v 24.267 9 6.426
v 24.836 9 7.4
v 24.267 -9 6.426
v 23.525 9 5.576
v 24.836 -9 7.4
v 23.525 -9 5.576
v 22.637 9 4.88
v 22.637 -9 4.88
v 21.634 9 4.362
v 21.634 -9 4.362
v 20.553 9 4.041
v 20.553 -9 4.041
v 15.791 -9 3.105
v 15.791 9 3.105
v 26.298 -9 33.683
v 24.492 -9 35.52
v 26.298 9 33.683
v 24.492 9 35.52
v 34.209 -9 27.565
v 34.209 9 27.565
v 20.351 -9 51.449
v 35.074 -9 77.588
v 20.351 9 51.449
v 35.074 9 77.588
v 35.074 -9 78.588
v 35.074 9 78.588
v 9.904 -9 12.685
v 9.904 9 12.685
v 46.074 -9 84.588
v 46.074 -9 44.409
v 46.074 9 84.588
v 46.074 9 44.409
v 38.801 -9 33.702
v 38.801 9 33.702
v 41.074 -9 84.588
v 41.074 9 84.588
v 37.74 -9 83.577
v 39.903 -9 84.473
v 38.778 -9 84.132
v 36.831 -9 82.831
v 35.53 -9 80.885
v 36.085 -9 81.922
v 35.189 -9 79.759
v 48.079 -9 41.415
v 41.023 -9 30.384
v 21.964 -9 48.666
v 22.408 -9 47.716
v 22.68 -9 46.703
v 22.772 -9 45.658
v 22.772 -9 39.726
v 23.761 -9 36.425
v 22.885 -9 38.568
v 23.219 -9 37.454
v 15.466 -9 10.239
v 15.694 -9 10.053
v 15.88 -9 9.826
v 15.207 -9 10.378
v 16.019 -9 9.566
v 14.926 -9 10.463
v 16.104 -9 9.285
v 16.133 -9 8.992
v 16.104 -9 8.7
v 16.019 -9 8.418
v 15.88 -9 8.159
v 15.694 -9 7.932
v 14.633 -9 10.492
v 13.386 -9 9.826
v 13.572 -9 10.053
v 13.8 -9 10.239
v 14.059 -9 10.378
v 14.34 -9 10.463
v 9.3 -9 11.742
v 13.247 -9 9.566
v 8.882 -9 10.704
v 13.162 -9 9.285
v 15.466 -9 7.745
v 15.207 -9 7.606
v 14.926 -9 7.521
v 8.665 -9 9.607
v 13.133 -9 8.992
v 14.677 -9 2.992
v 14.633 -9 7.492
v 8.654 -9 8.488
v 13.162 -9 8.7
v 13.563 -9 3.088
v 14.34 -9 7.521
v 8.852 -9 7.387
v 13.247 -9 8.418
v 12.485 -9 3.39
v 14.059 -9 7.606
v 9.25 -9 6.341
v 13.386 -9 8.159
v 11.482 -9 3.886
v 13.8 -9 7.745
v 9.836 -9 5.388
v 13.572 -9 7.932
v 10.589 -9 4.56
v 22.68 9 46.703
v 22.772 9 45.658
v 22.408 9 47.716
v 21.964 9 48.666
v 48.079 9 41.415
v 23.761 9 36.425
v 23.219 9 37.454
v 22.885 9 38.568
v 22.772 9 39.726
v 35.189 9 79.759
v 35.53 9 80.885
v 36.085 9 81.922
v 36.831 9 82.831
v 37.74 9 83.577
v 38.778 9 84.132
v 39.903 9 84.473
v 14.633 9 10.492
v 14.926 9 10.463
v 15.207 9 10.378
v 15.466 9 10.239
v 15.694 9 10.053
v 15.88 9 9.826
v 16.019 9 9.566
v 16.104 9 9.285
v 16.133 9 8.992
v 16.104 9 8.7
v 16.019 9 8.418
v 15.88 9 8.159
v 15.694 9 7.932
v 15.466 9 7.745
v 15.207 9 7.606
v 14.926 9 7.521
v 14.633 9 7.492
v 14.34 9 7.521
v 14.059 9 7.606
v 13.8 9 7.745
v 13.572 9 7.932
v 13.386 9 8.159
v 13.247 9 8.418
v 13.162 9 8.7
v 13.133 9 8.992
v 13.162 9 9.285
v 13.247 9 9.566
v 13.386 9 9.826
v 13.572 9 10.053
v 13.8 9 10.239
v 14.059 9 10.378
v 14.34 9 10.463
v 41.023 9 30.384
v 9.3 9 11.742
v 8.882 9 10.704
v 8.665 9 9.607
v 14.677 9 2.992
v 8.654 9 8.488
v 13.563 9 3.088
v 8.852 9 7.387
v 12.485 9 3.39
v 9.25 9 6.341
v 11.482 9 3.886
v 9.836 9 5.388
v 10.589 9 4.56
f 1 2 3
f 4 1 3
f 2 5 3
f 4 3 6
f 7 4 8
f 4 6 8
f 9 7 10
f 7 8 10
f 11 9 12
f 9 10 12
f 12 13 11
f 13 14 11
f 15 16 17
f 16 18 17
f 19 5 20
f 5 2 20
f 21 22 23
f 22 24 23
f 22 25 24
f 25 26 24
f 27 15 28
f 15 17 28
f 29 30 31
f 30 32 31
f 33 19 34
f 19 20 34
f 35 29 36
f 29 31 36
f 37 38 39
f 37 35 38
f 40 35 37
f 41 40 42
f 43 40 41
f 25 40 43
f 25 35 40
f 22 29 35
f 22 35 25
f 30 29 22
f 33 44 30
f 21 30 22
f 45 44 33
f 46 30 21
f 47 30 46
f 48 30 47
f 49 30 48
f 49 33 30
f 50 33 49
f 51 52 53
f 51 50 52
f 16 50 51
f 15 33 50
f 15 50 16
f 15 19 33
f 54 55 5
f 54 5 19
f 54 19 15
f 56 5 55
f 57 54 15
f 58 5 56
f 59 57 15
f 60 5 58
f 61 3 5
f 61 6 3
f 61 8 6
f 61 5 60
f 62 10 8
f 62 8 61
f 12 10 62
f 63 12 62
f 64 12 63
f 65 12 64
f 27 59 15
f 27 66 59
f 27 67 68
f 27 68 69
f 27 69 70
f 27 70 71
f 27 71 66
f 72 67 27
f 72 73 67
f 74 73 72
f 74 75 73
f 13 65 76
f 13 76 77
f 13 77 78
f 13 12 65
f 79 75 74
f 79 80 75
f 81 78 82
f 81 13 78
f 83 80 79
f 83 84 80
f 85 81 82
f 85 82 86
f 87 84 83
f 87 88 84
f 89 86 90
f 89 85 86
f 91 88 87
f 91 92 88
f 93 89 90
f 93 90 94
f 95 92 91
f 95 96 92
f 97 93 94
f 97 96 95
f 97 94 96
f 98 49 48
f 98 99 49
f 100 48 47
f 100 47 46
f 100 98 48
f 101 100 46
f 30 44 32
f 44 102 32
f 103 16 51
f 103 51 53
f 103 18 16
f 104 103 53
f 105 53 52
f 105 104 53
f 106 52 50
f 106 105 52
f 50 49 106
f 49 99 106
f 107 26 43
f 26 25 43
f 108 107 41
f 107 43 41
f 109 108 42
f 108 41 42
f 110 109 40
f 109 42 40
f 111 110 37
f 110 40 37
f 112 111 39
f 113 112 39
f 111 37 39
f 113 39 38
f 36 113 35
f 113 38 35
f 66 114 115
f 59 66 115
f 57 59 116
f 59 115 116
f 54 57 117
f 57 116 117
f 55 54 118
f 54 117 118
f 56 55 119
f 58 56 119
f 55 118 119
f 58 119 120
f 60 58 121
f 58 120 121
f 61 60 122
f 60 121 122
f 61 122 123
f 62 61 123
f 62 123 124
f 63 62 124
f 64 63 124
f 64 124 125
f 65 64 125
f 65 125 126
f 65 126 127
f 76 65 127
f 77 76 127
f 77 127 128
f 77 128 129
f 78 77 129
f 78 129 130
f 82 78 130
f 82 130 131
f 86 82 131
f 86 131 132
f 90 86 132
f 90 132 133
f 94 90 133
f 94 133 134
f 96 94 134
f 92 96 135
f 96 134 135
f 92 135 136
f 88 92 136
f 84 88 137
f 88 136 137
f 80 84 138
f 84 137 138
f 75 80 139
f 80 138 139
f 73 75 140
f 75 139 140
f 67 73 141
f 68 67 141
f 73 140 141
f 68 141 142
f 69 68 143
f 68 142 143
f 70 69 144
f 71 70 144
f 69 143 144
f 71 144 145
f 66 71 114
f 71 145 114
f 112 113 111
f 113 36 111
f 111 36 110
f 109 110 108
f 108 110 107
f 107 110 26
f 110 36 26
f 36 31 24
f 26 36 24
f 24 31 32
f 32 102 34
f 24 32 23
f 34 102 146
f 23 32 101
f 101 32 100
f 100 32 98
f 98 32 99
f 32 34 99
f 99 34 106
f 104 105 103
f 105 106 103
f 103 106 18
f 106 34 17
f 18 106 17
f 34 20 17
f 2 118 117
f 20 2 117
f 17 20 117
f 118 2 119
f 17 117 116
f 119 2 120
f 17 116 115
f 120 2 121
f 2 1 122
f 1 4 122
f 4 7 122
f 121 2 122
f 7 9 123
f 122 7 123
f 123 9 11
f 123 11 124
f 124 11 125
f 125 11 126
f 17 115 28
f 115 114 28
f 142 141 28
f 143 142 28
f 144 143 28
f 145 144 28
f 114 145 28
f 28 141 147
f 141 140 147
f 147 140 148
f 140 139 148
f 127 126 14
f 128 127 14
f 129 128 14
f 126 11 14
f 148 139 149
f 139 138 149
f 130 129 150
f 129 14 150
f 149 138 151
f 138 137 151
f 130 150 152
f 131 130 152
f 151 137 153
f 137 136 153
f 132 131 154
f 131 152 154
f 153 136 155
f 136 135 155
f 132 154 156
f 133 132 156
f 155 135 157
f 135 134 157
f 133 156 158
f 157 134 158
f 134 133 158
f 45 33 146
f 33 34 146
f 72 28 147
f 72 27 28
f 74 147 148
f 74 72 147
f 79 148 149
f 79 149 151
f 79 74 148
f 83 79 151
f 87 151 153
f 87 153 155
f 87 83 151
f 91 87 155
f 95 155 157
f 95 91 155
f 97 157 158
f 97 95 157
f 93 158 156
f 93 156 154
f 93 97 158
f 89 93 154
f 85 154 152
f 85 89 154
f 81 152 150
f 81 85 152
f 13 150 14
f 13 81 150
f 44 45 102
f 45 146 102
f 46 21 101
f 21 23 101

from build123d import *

# Parameters (mm, degrees)
BOSS_EXTRUDE1_DEPTH = 9
FILLET1_R           = 6
FILLET2_R           = 6
FILLET3_R           = 6
SKETCH4_R           = 1.5
CUT_EXTRUDE2_DEPTH  = 99.948249762


with BuildPart() as part:
    # Sketch1 → Boss-Extrude1 (new, symmetric)
    with BuildSketch(Plane(origin=(0, 0, 0), x_dir=(1, 0, 0), z_dir=(0, 1, 0))):
        Polygon((26.298098503, -33.68255382), (0, 0), (23.549059428, -4.630529132), (34.208885562, -27.565410034), (38.800851719, -33.702486103), (41.023010007, -30.384019108), (48.078540091, -41.414607796), (46.07366082, -44.408600496), (46.07366082, -84.588475064), (35.07366082, -84.588475064), (35.07366082, -77.588475064), (20.351319641, -51.449372742), (22.771974432, -47.270927217), (22.771974432, -37.270927217), align=None)
    extrude(amount=BOSS_EXTRUDE1_DEPTH, both=True)

    # Fillet1
    fillet1_edges = [part.edges().sort_by_distance(p)[0] for p in [
        (0, 0, 0),
        (23.549059428, 0, 4.630529132),
    ]]
    fillet(fillet1_edges, radius=FILLET1_R)

    # Fillet2
    fillet2_edges = [part.edges().sort_by_distance(p)[0] for p in [
        (22.771974432, 0, 47.270927217),
        (22.771974432, 0, 37.270927217),
    ]]
    fillet(fillet2_edges, radius=FILLET2_R)

    # Fillet3
    fillet3_edges = [part.edges().sort_by_distance(p)[0] for p in [
        (35.07366082, 0, 84.588475064),
    ]]
    fillet(fillet3_edges, radius=FILLET3_R)

    # Sketch4 → Cut-Extrude2 (cut, through all)
    with BuildSketch(Plane(origin=(0, 9, 0), x_dir=(1, 0, 0), z_dir=(0, 1, 0))):
        with Locations(Location((14.632977879, -8.992224551, 0), (0, 0, 270))):
            Circle(SKETCH4_R)
    extrude(amount=-CUT_EXTRUDE2_DEPTH, mode=Mode.SUBTRACT)


solid = part.part
